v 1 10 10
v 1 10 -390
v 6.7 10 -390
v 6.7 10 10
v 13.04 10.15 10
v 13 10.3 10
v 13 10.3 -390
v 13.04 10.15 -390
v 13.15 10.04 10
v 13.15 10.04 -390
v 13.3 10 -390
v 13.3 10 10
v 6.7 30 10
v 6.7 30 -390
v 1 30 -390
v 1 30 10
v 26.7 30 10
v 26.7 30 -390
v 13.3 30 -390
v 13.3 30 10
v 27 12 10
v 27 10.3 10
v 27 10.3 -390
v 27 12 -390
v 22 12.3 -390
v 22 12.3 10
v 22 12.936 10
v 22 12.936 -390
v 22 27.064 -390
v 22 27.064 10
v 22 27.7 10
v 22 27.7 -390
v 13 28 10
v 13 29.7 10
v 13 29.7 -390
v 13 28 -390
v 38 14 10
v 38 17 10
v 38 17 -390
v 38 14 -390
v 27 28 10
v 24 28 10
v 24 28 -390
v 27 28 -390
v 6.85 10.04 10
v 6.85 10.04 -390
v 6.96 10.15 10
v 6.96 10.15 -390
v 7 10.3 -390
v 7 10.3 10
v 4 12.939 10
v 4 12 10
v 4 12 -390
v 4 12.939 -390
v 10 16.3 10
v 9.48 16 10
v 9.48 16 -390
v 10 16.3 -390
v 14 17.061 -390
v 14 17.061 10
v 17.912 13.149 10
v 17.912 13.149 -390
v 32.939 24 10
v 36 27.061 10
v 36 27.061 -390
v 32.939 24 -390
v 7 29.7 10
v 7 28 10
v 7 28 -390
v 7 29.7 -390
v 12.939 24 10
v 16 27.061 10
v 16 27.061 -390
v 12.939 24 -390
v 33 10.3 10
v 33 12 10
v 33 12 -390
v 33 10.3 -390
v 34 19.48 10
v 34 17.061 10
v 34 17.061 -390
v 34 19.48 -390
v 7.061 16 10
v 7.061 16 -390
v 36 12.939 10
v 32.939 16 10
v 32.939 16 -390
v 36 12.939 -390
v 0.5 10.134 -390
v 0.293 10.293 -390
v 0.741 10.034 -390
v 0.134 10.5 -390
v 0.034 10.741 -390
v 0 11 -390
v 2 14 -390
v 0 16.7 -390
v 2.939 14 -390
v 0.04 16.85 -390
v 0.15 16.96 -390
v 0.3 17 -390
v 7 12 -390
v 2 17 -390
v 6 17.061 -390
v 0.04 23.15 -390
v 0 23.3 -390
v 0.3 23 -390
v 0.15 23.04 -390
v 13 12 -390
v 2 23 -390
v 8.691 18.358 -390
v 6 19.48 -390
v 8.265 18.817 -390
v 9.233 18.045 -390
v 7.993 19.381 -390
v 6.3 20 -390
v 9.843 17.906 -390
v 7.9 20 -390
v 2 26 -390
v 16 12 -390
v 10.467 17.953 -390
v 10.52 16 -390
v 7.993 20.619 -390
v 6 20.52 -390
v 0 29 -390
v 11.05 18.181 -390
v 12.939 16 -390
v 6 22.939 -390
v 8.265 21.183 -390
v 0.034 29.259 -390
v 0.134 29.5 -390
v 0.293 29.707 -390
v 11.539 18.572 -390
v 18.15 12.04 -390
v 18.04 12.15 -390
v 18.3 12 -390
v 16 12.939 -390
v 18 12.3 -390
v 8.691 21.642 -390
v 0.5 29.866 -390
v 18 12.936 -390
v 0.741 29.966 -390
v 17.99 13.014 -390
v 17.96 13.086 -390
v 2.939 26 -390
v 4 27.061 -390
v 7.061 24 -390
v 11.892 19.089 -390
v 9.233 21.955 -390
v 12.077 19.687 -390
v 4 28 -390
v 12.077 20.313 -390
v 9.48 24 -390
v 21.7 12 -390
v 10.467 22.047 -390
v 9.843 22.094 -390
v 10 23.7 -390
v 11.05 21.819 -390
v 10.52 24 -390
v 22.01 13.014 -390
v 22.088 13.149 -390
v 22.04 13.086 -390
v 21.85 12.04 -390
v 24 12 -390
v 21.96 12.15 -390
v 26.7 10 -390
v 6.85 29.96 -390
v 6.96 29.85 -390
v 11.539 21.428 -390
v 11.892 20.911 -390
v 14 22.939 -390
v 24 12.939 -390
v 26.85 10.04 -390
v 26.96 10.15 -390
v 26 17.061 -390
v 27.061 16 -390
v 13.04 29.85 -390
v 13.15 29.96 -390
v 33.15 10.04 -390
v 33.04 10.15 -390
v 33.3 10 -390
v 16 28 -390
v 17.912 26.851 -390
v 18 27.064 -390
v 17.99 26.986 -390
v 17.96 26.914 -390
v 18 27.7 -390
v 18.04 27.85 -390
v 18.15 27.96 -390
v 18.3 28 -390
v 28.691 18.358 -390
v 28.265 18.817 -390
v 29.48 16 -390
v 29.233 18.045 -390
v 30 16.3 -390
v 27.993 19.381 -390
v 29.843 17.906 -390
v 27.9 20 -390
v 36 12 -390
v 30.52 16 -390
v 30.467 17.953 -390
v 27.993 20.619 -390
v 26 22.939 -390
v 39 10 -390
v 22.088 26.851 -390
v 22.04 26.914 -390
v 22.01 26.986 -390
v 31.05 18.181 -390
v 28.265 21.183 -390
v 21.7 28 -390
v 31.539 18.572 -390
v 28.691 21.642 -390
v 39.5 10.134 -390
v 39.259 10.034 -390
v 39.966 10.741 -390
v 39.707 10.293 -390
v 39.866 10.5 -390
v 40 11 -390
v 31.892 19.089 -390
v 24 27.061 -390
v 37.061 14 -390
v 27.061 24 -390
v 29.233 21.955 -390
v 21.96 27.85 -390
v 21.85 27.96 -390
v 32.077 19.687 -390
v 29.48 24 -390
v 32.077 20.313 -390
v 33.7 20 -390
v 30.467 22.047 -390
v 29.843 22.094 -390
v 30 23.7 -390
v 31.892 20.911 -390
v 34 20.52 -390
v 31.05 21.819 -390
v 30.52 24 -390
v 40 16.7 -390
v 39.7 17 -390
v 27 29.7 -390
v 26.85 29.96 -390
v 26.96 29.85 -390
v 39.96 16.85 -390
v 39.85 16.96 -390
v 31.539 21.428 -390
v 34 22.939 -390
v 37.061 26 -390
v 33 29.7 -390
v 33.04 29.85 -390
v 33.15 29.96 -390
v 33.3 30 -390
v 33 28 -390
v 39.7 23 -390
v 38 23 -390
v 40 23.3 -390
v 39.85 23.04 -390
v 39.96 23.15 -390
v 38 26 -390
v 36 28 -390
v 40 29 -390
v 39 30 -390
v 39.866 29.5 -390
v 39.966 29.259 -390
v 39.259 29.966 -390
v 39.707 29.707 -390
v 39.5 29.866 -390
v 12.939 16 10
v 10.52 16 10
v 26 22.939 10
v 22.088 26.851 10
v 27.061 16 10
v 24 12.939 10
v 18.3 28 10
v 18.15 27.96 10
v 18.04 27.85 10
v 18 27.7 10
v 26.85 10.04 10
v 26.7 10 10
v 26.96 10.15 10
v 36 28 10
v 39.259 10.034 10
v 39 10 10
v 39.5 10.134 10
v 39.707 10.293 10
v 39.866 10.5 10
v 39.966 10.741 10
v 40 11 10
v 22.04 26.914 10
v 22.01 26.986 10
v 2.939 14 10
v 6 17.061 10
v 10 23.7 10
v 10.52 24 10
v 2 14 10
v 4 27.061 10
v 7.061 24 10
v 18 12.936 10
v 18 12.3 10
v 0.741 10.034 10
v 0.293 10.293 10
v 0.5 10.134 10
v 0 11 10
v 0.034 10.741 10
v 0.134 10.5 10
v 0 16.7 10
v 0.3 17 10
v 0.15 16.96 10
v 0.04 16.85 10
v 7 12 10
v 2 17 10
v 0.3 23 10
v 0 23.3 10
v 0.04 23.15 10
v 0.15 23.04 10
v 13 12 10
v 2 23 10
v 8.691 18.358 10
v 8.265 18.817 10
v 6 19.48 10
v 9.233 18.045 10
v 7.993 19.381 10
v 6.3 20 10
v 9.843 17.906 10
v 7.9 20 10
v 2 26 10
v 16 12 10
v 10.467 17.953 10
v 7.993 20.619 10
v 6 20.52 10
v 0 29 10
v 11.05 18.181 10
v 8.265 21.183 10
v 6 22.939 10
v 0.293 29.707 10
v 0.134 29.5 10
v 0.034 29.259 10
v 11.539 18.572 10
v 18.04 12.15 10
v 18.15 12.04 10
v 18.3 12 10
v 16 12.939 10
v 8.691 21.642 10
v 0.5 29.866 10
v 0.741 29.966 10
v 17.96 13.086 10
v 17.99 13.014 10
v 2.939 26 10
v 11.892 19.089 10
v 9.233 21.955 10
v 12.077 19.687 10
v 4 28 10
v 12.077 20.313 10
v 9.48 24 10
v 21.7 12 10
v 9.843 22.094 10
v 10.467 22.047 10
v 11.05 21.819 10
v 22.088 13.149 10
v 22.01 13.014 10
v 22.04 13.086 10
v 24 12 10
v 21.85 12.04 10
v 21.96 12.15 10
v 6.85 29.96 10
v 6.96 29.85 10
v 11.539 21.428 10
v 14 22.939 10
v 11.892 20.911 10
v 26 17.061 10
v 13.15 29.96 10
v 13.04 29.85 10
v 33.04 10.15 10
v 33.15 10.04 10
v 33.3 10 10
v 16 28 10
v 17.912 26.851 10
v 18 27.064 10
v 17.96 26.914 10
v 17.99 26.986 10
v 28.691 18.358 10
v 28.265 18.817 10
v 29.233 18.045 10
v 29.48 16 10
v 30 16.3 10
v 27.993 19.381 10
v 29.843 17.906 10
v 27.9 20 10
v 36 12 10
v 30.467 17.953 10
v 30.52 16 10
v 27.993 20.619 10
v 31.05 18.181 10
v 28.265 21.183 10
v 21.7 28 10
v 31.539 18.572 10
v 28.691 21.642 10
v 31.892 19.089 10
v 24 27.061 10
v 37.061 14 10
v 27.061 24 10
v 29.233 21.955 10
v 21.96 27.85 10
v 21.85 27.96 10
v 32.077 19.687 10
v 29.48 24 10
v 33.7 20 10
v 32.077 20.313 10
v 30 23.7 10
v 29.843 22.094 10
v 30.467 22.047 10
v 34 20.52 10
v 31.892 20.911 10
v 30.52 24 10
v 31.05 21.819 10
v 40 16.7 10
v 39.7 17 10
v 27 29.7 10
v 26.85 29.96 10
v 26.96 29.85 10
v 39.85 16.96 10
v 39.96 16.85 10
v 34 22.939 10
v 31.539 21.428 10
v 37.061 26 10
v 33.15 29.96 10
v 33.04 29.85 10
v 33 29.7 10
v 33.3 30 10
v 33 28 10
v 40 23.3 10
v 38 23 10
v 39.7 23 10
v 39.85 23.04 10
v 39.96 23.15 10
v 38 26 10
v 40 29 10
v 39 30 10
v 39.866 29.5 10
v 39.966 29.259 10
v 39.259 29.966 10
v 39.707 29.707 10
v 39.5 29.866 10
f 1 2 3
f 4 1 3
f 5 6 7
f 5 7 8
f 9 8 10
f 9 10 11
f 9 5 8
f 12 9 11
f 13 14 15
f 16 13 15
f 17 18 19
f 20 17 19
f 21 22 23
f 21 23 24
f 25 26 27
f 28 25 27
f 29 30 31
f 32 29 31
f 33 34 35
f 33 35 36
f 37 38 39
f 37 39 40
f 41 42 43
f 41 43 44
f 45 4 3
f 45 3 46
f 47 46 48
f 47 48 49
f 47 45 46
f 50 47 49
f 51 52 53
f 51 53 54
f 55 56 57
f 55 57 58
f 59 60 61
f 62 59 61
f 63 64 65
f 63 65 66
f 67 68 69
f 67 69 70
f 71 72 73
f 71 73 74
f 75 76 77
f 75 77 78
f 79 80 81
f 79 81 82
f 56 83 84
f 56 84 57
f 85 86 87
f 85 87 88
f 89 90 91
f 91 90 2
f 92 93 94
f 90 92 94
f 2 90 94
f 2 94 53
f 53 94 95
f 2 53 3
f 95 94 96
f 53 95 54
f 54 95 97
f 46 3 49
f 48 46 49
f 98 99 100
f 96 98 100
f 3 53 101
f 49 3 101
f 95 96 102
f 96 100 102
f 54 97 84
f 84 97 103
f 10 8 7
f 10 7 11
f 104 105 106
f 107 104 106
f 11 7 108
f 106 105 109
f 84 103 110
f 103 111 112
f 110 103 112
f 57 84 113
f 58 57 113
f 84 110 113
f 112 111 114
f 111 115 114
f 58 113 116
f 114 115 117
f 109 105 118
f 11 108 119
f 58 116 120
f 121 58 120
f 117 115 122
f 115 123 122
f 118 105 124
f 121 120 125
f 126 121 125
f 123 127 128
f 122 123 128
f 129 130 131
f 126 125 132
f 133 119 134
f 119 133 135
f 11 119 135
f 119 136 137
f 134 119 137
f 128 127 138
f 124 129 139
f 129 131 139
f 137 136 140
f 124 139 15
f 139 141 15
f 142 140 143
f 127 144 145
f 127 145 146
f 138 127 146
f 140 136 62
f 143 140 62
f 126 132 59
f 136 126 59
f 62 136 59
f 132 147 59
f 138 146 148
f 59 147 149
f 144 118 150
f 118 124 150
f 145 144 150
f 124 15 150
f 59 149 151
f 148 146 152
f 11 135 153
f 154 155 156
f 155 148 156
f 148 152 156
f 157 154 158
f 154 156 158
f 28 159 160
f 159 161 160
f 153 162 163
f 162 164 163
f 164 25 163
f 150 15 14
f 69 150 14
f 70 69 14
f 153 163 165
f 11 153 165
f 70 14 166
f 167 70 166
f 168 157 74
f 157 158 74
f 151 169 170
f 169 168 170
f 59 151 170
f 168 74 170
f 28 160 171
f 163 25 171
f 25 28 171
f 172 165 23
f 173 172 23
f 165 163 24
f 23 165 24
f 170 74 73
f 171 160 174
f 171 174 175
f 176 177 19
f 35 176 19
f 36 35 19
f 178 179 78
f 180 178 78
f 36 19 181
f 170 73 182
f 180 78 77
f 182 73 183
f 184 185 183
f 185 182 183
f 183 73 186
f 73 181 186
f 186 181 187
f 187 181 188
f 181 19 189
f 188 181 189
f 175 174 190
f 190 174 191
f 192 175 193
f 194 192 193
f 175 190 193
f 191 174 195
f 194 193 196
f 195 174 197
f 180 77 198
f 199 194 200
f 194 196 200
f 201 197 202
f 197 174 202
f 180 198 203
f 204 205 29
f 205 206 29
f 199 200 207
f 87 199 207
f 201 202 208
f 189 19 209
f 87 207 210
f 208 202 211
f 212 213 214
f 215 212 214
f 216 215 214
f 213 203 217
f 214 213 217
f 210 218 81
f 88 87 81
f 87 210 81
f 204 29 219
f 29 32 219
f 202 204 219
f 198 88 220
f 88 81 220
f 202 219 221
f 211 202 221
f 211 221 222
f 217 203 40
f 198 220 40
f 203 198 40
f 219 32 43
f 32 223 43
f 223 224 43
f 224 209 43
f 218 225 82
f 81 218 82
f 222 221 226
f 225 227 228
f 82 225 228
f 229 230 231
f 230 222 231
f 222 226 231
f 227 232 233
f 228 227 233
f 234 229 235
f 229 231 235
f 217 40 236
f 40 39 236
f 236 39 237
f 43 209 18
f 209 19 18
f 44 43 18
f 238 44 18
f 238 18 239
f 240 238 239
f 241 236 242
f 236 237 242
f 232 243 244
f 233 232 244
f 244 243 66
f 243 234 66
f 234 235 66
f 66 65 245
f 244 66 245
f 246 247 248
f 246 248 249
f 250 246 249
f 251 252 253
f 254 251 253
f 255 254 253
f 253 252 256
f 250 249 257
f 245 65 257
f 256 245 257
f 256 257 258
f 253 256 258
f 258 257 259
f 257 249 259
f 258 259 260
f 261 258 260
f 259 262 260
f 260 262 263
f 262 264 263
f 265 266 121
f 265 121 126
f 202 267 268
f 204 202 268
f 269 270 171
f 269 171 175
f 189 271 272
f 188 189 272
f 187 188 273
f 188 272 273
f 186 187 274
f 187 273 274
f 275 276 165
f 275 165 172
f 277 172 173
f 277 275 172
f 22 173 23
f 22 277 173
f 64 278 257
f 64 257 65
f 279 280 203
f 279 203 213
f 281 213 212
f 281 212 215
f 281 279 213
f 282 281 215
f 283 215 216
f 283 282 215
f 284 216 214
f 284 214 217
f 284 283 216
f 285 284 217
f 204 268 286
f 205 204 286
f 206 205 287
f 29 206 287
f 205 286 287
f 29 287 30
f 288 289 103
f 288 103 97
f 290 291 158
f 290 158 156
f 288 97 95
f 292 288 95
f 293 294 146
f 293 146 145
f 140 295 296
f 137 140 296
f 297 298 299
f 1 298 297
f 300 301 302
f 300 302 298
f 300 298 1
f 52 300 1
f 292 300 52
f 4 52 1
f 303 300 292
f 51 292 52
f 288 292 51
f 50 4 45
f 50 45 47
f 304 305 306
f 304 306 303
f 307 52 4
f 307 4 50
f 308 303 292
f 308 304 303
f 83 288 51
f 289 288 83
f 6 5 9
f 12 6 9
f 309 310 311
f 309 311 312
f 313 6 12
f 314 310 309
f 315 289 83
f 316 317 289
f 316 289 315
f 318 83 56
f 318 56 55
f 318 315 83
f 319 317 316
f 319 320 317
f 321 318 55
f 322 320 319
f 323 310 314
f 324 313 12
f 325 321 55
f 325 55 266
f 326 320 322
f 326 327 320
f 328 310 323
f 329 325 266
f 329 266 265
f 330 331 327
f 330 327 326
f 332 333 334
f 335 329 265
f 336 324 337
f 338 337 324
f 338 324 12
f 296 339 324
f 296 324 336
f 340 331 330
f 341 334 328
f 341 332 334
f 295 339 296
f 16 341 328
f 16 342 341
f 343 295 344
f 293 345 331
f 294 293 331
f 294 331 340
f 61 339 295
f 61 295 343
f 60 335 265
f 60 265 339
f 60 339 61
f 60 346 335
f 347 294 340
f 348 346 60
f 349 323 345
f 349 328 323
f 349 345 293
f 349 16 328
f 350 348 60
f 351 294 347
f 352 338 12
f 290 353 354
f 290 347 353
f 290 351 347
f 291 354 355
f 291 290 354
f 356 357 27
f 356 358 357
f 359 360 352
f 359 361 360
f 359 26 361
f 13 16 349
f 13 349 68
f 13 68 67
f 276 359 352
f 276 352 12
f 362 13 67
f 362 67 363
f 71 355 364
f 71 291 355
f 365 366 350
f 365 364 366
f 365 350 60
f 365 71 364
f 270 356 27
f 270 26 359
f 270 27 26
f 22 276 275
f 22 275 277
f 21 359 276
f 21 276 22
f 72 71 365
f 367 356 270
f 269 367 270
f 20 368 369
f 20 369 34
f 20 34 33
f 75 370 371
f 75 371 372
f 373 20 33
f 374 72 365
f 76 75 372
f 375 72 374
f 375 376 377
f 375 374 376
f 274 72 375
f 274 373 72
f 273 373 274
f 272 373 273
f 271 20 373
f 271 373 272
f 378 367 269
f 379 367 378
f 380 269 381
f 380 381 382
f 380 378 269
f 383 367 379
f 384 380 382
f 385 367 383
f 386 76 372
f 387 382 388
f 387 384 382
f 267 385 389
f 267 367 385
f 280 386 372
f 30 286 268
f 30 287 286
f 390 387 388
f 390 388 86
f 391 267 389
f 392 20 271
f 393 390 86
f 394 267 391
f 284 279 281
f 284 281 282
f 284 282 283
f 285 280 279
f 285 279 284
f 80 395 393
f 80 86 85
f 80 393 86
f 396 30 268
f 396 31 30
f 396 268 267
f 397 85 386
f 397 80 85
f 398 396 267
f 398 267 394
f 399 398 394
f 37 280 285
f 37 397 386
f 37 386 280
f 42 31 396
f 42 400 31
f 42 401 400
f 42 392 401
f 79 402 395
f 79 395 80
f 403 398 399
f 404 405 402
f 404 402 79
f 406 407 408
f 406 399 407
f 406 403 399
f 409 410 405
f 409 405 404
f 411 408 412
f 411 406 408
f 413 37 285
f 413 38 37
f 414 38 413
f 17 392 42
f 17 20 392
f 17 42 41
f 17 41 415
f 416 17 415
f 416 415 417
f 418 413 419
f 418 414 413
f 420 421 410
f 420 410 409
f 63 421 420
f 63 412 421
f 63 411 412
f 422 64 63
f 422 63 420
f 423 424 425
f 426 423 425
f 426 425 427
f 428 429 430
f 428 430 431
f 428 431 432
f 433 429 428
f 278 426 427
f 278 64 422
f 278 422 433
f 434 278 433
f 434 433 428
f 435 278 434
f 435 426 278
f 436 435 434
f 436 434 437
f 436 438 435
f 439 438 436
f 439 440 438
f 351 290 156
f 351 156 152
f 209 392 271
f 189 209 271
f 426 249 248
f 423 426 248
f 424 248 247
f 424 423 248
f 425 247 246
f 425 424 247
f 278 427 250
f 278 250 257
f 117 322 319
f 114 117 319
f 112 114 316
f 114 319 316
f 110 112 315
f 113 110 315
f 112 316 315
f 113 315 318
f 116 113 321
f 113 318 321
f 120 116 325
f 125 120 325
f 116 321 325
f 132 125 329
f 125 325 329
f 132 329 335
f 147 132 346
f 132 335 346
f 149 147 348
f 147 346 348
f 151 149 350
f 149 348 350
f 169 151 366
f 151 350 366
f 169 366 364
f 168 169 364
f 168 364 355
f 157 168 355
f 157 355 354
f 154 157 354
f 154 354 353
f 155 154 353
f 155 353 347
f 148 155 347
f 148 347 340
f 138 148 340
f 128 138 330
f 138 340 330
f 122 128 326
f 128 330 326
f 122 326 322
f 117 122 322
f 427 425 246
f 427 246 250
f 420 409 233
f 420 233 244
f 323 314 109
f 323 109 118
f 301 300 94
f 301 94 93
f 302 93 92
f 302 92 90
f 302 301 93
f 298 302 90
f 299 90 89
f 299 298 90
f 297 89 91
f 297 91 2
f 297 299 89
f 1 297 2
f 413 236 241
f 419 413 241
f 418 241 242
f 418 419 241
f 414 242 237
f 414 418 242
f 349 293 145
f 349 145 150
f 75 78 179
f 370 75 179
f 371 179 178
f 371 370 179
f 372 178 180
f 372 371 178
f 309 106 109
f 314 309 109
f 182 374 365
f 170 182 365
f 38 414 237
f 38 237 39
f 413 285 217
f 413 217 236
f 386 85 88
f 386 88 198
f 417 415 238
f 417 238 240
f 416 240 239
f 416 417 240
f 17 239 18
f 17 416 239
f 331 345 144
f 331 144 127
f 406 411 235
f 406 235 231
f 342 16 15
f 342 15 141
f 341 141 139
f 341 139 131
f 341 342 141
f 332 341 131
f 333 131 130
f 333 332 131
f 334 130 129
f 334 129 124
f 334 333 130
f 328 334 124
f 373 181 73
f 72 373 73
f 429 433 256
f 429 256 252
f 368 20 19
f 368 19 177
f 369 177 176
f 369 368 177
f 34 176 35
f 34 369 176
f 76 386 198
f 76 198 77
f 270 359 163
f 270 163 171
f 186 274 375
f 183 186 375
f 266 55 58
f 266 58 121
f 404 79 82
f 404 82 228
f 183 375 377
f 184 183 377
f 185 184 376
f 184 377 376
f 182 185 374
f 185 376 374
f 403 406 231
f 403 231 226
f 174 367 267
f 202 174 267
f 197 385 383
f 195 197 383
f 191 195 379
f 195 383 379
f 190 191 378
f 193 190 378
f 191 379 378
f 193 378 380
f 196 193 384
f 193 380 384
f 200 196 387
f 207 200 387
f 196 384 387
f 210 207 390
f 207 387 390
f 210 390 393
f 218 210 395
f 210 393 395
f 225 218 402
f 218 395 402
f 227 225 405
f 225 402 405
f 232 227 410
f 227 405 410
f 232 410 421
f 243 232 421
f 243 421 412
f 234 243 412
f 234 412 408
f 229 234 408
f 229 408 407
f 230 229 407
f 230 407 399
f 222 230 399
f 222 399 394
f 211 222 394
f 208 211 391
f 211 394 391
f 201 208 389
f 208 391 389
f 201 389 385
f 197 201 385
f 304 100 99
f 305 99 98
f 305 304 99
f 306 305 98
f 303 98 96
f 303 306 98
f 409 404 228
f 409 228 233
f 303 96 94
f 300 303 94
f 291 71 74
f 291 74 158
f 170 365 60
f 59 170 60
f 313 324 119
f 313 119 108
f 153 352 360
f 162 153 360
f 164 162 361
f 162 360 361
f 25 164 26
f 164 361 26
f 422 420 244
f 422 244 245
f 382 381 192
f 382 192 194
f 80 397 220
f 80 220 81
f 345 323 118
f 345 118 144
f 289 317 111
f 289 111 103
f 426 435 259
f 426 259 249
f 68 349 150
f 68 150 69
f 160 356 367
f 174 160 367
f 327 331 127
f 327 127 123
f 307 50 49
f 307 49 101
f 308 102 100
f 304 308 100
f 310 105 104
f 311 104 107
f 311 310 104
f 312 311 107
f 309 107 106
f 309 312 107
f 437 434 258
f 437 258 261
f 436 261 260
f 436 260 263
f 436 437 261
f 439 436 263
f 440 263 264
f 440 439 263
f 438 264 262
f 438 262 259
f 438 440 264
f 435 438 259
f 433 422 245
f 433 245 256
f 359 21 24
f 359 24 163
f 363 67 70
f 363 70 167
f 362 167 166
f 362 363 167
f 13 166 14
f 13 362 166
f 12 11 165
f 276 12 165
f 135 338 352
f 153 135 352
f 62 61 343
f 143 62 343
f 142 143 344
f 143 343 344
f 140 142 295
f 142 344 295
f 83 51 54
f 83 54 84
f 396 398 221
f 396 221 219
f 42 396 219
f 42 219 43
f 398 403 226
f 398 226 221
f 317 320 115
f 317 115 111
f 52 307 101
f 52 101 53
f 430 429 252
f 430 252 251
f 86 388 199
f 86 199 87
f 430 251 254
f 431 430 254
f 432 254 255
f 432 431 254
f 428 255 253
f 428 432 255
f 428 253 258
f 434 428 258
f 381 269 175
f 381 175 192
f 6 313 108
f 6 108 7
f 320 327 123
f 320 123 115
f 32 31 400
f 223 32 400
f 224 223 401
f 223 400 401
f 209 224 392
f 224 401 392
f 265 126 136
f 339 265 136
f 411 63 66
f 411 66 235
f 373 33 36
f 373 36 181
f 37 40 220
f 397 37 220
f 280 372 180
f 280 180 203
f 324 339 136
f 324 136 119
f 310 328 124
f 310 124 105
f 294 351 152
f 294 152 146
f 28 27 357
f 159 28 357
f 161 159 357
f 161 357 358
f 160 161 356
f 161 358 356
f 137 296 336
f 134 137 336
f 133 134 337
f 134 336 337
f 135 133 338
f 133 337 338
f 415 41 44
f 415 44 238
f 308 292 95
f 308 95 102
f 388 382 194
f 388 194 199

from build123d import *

# Parameters (mm, degrees)
SKETCH1_R           = 2.0999999
BOSS_EXTRUDE2_DEPTH = 400


# Read off the part's stored shape, not the designer's step: Imported1
with BuildPart() as part:
    # Sketch1 → Boss-Extrude2 (new body)
    with BuildSketch(Plane.XY.offset(10)):
        with BuildLine():
            Line((15.999999496, 12), (12.9999995, 12))
            Line((12.9999995, 12), (12.9999995, 10.3))
            ThreePointArc((12.9999995, 10.3), (13.087867466, 10.087867966), (13.2999995, 10))
            Line((13.2999995, 10), (26.7, 10))
            ThreePointArc((26.7, 10), (26.912132034, 10.087867966), (27, 10.3))
            Line((27, 10.3), (27, 12))
            Line((27, 12), (24, 12))
            Line((24, 12), (24, 12.9393436))
            Line((24, 12.9393436), (27.06068075, 16))
            Line((27.06068075, 16), (29.480384758, 16))
            Line((29.480384758, 16), (30, 16.3))
            Line((30, 16.3), (30.519615242, 16))
            Line((30.519615242, 16), (32.93933675, 16))
            Line((32.93933675, 16), (36, 12.9393398))
            Line((36, 12.9393398), (36, 12))
            Line((36, 12), (33, 12))
            Line((33, 12), (33, 10.3))
            ThreePointArc((33, 10.3), (33.087867966, 10.087867966), (33.3, 10))
            Line((33.3, 10), (39, 10))
            ThreePointArc((39, 10), (39.707106781, 10.292893219), (40, 11))
            Line((40, 11), (40, 16.7))
            ThreePointArc((40, 16.7), (39.912132034, 16.912132034), (39.7, 17))
            Line((39.7, 17), (38, 17))
            Line((38, 17), (38, 14))
            Line((38, 14), (37.0606655, 13.99999425))
            Line((37.0606655, 13.99999425), (34, 17.060646))
            Line((34, 17.060646), (34, 19.480361375))
            Line((34, 19.480361375), (33.6999865, 20))
            Line((33.6999865, 20), (33.9999865, 20.519615242))
            Line((33.9999865, 20.519615242), (33.9999865, 22.9393395))
            Line((33.9999865, 22.9393395), (37.060675, 25.999997))
            Line((37.060675, 25.999997), (38, 25.999997))
            Line((38, 25.999997), (38, 23))
            Line((38, 23), (39.7, 23))
            ThreePointArc((39.7, 23), (39.912132034, 23.087867966), (40, 23.3))
            Line((40, 23.3), (40, 29))
            ThreePointArc((40, 29), (39.707106781, 29.707106781), (39, 30))
            Line((39, 30), (33.3, 30))
            ThreePointArc((33.3, 30), (33.087867966, 29.912132034), (33, 29.7))
            Line((33, 29.7), (33, 28))
            Line((33, 28), (36, 28))
            Line((36, 28), (36, 27.0606575))
            Line((36, 27.0606575), (32.9393565, 24))
            Line((32.9393565, 24), (30.519615242, 24))
            Line((30.519615242, 24), (30, 23.7))
            Line((30, 23.7), (29.480384758, 24))
            Line((29.480384758, 24), (27.06066, 24))
            Line((27.06066, 24), (24.0000025, 27.0606565))
            Line((24.0000025, 27.0606565), (24.0000025, 28))
            Line((24.0000025, 28), (27, 28))
            Line((27, 28), (27, 29.7))
            ThreePointArc((27, 29.7), (26.912132034, 29.912132034), (26.7, 30))
            Line((26.7, 30), (13.2999995, 30))
            ThreePointArc((13.2999995, 30), (13.087867466, 29.912132034), (12.9999995, 29.7))
            Line((12.9999995, 29.7), (12.9999995, 28))
            Line((12.9999995, 28), (15.9999995, 28))
            Line((15.9999995, 28), (15.9999995, 27.06066257))
            Line((15.9999995, 27.06066257), (12.9393312, 24))
            Line((12.9393312, 24), (10.519614742, 24))
            Line((10.519614742, 24), (9.9999995, 23.7))
            Line((9.9999995, 23.7), (9.480384258, 24))
            Line((9.480384258, 24), (7.0606425, 24))
            Line((7.0606425, 24), (3.9999995, 27.0606365))
            Line((3.9999995, 27.0606365), (3.9999995, 28))
            Line((3.9999995, 28), (6.9999995, 28))
            Line((6.9999995, 28), (6.9999995, 29.7))
            ThreePointArc((6.9999995, 29.7), (6.912131534, 29.912132034), (6.6999995, 30))
            Line((6.6999995, 30), (1, 30))
            ThreePointArc((1, 30), (0.292893219, 29.707106781), (0, 29))
            Line((0, 29), (0, 23.3))
            ThreePointArc((0, 23.3), (0.087867966, 23.087867966), (0.3, 23))
            Line((0.3, 23), (2, 23))
            Line((2, 23), (2, 25.999998))
            Line((2, 25.999998), (2.9393195, 25.999998))
            Line((2.9393195, 25.999998), (6, 22.939318))
            Line((6, 22.939318), (6, 20.519615242))
            Line((6, 20.519615242), (6.3, 20))
            Line((6.3, 20), (6, 19.480384758))
            Line((6, 19.480384758), (6, 17.0606635))
            Line((6, 17.0606635), (2.9393372, 14))
            Line((2.9393372, 14), (2, 14))
            Line((2, 14), (2, 17))
            Line((2, 17), (0.3, 17))
            ThreePointArc((0.3, 17), (0.087867966, 16.912132034), (0, 16.7))
            Line((0, 16.7), (0, 11))
            ThreePointArc((0, 11), (0.292893219, 10.292893219), (1, 10))
            Line((1, 10), (6.6999995, 10))
            ThreePointArc((6.6999995, 10), (6.912131534, 10.087867966), (6.9999995, 10.3))
            Line((6.9999995, 10.3), (6.9999995, 12))
            Line((6.9999995, 12), (3.999991, 12))
            Line((3.999991, 12), (3.999991, 12.93933465))
            Line((3.999991, 12.93933465), (7.0606385, 16))
            Line((7.0606385, 16), (9.480384258, 16))
            Line((9.480384258, 16), (9.9999995, 16.3))
            Line((9.9999995, 16.3), (10.519614742, 16))
            Line((10.519614742, 16), (12.93931635, 16))
            Line((12.93931635, 16), (15.999999496, 12.9393436))
            Line((15.999999496, 12.9393436), (15.999999496, 12))
        make_face()
        with Locations(Location((9.9999995, 20, 0), (0, 0, 180))):
            Circle(SKETCH1_R, mode=Mode.SUBTRACT)
        with Locations(Location((30, 20, 0), (0, 0, 180))):
            Circle(SKETCH1_R, mode=Mode.SUBTRACT)
        with BuildLine():
            Line((17.99999975, 12.936400074), (17.99999975, 12.3))
            ThreePointArc((17.99999975, 12.3), (18.087867716, 12.087867966), (18.29999975, 12))
            Line((18.29999975, 12), (21.6999995, 12))
            ThreePointArc((21.6999995, 12), (21.912131534, 12.087867966), (21.9999995, 12.3))
            Line((21.9999995, 12.3), (21.9999995, 12.936400498))
            ThreePointArc((21.9999995, 12.936400498), (22.022835631, 13.051205559), (22.087867469, 13.148532591))
            Line((22.087867469, 13.148532591), (26, 17.0606645))
            Line((26, 17.0606645), (26, 22.939339))
            Line((26, 22.939339), (22.087867469, 26.851468459))
            ThreePointArc((22.087867469, 26.851468459), (22.022835646, 26.948794955), (21.9999995, 27.063599552))
            Line((21.9999995, 27.063599552), (21.9999995, 27.7))
            ThreePointArc((21.9999995, 27.7), (21.912131534, 27.912132034), (21.6999995, 28))
            Line((21.6999995, 28), (18.29999975, 28))
            ThreePointArc((18.29999975, 28), (18.087867716, 27.912132034), (17.99999975, 27.7))
            Line((17.99999975, 27.7), (17.99999975, 27.063604538))
            ThreePointArc((17.99999975, 27.063604538), (17.977163602, 26.948799949), (17.912131781, 26.851473459))
            Line((17.912131781, 26.851473459), (14, 22.939335))
            Line((14, 22.939335), (14, 17.06066805))
            Line((14, 17.06066805), (17.912135369, 13.14852345))
            ThreePointArc((17.912135369, 13.14852345), (17.977164541, 13.051200418), (17.99999975, 12.936400074))
        make_face(mode=Mode.SUBTRACT)
    extrude(amount=-BOSS_EXTRUDE2_DEPTH)


solid = part.part
